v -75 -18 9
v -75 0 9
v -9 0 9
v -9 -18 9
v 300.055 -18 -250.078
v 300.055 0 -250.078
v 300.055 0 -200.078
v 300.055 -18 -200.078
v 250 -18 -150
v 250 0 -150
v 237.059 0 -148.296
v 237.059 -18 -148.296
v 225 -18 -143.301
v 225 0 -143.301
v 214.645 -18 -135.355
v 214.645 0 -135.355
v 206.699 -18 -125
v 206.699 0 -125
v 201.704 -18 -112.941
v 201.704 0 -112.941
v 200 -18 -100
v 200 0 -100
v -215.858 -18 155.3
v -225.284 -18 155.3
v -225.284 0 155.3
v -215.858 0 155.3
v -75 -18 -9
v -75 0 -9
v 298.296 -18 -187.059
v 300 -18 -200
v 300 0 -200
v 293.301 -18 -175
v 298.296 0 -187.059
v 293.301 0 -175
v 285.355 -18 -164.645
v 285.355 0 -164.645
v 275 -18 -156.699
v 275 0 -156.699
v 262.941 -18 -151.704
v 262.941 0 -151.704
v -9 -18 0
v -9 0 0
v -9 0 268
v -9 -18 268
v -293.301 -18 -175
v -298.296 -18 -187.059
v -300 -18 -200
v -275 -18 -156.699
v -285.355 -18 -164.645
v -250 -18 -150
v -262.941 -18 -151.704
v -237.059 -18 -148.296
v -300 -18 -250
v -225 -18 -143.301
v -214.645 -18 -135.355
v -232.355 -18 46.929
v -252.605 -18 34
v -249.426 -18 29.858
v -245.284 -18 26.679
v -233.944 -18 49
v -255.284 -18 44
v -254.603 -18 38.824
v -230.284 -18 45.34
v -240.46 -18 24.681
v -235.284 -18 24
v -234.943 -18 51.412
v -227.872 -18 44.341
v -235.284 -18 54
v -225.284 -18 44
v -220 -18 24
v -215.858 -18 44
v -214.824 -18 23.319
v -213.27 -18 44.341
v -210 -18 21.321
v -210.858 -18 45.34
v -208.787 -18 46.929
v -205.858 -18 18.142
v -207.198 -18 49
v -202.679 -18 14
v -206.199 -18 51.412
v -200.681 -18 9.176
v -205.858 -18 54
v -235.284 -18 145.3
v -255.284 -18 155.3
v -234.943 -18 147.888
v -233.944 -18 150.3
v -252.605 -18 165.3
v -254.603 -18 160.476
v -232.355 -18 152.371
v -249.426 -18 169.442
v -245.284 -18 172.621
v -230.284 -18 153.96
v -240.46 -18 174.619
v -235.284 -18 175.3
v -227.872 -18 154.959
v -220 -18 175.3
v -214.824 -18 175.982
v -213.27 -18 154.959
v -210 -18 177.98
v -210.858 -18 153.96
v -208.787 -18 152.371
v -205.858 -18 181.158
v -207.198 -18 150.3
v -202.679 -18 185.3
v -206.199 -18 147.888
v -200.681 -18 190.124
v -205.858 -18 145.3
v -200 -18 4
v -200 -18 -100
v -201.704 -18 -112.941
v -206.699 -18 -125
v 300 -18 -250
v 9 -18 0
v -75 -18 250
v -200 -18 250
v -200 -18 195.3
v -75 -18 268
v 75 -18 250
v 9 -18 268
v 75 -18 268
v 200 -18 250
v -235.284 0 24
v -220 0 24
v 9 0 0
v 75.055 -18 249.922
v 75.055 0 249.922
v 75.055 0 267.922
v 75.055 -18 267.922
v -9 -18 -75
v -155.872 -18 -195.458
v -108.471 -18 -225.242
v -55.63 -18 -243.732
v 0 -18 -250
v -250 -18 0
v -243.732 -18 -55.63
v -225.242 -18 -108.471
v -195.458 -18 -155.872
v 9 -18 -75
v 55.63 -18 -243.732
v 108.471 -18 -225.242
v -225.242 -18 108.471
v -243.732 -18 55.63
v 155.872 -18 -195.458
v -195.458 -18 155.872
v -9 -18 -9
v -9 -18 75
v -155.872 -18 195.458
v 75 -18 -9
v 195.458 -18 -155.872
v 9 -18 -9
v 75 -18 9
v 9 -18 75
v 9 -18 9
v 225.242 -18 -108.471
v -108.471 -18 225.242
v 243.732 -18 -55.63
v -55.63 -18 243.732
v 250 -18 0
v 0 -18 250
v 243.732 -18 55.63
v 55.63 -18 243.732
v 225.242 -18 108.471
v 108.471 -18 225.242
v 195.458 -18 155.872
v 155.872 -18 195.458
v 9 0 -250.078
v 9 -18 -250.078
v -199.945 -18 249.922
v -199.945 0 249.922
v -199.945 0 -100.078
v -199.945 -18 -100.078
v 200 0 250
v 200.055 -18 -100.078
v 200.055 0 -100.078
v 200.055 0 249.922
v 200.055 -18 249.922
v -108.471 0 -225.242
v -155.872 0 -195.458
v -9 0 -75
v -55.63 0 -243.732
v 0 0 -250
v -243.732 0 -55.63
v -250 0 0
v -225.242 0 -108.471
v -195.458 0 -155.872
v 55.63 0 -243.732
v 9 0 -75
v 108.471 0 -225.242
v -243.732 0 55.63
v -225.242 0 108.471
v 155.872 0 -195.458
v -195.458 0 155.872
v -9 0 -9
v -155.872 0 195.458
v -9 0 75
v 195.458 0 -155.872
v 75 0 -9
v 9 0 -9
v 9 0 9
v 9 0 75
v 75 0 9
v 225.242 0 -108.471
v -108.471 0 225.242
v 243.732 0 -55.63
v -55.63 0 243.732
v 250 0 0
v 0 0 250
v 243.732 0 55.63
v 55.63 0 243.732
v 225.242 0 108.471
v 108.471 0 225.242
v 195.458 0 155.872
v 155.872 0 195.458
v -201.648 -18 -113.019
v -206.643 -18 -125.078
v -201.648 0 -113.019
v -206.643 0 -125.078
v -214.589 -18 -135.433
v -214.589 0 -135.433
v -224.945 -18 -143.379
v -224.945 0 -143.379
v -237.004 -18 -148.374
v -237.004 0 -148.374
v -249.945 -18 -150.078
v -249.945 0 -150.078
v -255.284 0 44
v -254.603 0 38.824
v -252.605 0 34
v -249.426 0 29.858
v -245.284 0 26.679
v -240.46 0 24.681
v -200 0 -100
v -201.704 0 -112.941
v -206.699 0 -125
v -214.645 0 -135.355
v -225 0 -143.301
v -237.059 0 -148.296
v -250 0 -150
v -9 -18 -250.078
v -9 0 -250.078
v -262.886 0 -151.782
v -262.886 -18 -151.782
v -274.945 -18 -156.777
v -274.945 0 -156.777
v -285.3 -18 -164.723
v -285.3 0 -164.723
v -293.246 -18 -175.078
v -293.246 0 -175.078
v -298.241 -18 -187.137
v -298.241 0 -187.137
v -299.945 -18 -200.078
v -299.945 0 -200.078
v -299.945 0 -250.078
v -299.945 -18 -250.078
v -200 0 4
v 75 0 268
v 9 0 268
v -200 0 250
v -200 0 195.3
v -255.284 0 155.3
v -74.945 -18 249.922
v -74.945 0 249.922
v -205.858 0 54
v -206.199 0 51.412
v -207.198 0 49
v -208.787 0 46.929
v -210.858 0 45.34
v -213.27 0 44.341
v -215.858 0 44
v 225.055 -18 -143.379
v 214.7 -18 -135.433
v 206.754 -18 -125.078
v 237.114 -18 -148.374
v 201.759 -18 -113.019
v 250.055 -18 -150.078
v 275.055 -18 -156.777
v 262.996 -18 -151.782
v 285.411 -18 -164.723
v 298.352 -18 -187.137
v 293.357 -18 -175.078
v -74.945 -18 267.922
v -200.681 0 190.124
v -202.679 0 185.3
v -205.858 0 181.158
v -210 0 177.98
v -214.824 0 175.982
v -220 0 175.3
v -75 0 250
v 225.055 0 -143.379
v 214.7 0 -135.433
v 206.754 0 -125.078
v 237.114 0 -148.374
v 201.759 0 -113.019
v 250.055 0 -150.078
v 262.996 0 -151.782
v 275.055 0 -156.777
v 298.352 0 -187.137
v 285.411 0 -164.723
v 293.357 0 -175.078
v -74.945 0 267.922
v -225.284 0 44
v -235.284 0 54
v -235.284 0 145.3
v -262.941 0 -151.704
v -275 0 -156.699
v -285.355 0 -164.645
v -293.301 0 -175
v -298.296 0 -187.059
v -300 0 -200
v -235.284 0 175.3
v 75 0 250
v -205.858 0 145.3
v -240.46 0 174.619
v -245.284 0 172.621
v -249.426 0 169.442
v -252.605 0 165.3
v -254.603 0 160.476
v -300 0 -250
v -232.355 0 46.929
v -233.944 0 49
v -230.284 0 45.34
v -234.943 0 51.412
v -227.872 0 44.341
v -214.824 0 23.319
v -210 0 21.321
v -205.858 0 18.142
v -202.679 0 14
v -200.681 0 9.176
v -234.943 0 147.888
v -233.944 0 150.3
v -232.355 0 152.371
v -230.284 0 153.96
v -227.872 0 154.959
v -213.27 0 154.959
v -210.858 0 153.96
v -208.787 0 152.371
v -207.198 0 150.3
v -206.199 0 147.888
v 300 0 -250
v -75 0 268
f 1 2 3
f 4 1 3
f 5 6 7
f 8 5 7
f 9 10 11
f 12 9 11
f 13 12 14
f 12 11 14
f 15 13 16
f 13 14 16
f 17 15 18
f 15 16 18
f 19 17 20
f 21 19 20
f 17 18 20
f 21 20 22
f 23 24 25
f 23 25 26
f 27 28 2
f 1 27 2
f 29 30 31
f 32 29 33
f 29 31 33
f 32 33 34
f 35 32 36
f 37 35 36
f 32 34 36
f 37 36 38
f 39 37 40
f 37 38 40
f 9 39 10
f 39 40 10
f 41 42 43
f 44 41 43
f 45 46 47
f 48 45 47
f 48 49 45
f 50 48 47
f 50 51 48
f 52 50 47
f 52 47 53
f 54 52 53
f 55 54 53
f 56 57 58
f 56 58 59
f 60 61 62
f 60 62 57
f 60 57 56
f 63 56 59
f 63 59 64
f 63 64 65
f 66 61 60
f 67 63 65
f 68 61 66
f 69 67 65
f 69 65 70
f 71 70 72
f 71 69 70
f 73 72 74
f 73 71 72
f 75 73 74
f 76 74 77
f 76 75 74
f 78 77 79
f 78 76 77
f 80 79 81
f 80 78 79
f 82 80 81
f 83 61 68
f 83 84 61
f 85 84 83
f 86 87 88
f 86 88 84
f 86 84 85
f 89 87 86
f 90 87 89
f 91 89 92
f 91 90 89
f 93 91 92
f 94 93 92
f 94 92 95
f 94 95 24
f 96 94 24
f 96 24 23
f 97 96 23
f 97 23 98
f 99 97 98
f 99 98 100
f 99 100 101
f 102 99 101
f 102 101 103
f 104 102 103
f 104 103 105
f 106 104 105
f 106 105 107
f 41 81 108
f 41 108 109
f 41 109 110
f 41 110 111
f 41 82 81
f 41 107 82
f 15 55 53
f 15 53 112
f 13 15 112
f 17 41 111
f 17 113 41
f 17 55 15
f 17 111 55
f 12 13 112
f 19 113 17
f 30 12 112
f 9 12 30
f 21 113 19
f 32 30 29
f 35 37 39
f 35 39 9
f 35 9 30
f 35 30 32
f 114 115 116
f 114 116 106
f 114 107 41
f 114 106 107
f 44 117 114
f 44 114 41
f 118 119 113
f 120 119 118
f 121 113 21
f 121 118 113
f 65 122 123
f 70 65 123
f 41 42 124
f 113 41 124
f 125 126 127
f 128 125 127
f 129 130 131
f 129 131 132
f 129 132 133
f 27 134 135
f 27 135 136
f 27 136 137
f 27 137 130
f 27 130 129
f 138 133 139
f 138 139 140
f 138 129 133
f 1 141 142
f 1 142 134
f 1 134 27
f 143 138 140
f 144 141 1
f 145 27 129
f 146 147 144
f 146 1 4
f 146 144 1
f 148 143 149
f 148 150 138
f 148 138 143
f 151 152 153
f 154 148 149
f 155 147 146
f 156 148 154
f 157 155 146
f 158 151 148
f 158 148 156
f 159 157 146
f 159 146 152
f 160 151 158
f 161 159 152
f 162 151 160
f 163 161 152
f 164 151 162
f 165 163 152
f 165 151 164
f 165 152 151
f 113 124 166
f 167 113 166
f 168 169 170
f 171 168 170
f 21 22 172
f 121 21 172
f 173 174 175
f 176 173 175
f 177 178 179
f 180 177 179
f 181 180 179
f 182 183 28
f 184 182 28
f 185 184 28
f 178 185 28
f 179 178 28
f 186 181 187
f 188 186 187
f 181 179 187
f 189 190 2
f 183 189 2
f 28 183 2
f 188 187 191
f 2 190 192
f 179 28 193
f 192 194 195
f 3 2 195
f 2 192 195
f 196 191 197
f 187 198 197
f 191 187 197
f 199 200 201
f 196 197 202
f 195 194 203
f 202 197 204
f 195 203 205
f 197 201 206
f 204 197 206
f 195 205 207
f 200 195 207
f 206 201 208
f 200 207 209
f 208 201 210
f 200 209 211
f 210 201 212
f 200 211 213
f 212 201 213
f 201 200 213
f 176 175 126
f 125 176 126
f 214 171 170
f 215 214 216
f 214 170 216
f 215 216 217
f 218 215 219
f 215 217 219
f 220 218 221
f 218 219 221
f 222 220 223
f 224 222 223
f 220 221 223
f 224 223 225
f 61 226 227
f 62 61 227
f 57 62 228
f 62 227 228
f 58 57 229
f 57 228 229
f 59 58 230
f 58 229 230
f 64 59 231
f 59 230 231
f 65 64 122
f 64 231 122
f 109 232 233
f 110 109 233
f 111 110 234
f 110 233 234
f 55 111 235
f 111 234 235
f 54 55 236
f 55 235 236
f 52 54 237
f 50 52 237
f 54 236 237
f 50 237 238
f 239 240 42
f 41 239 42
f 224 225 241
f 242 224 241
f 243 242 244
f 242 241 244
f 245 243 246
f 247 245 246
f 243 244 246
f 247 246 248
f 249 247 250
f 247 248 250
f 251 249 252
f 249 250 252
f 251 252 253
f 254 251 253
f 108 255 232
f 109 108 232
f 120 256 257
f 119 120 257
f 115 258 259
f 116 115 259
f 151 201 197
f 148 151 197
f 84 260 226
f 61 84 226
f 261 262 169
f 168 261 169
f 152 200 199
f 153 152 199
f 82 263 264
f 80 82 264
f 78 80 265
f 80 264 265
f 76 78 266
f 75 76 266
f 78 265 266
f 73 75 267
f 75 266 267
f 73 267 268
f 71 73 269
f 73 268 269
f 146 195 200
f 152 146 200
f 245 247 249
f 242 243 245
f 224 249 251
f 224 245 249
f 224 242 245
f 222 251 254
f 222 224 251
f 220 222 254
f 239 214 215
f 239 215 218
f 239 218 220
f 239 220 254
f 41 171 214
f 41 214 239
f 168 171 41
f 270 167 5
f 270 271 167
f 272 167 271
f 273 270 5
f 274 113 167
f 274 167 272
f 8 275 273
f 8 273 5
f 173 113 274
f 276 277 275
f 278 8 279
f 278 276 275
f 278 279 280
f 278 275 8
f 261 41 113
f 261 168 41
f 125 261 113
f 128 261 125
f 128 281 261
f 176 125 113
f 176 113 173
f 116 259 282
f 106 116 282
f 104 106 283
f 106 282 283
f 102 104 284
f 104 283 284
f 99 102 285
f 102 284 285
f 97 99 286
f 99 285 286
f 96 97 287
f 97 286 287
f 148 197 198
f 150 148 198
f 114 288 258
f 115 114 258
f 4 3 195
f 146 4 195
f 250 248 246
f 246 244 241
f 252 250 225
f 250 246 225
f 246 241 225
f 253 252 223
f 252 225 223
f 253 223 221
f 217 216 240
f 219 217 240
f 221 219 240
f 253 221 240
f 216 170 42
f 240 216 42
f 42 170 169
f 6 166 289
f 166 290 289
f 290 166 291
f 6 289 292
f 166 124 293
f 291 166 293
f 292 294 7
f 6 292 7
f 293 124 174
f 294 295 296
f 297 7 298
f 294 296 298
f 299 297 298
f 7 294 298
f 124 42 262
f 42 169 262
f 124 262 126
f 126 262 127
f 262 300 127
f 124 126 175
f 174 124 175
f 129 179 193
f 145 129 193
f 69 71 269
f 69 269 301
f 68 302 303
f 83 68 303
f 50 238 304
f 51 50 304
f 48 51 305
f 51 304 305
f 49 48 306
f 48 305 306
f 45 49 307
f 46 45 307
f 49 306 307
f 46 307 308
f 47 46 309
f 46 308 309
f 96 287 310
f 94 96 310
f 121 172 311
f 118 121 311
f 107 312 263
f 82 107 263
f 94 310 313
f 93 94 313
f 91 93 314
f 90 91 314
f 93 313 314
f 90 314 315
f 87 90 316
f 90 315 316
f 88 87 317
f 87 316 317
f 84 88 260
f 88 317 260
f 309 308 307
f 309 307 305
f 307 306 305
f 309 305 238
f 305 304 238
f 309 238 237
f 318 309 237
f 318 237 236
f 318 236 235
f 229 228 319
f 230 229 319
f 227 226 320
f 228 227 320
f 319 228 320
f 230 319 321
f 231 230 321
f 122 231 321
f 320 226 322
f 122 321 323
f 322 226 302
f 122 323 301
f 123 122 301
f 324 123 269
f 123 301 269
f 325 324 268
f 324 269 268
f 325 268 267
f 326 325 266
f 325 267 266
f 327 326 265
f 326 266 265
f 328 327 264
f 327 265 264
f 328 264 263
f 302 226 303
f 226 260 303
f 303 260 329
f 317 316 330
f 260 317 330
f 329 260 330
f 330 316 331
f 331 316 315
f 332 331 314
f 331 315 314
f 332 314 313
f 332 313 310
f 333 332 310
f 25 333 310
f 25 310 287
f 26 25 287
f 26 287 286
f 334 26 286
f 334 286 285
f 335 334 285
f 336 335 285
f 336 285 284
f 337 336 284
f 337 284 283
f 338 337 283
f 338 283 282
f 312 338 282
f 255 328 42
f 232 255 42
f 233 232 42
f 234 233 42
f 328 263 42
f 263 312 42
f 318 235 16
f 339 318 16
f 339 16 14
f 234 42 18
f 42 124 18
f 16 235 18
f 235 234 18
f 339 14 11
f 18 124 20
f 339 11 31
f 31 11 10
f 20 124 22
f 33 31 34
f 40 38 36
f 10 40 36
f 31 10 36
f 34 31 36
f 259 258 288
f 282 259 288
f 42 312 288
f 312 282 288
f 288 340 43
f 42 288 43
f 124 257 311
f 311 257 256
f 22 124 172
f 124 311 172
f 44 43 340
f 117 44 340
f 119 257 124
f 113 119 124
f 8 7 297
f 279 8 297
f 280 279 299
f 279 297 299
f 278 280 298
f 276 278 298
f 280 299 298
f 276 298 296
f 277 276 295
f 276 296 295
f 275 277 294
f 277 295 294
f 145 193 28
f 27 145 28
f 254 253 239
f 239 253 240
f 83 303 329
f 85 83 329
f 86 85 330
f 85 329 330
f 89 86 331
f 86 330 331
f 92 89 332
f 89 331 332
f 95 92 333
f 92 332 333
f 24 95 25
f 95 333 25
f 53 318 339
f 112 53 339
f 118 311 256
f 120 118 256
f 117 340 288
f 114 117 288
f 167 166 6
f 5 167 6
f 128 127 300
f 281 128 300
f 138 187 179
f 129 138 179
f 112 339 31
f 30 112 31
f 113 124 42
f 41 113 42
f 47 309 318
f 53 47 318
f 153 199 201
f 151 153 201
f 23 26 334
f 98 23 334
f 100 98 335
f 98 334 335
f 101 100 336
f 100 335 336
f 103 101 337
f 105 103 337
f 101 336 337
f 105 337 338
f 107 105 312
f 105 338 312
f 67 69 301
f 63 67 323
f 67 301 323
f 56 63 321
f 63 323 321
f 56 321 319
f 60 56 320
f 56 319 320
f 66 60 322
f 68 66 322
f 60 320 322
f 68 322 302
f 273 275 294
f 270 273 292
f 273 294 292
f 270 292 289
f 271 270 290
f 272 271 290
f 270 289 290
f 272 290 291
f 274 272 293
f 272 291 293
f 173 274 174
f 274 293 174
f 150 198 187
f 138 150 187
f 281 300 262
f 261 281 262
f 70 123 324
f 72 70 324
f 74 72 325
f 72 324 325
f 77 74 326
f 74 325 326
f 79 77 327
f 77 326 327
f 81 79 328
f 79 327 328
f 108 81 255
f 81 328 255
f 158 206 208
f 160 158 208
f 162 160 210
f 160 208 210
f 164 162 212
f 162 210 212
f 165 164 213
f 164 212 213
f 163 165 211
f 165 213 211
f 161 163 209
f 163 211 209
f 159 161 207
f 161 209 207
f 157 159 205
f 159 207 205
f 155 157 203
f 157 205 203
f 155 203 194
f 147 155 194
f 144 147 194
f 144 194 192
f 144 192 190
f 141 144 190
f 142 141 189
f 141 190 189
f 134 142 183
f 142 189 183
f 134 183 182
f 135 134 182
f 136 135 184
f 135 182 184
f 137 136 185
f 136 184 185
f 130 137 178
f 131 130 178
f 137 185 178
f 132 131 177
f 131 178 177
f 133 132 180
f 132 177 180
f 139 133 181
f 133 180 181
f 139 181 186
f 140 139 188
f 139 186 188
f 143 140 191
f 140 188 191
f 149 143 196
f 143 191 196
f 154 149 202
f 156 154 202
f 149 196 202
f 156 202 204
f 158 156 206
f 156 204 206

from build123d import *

# Parameters (mm, degrees)
F2_DEPTH = 18
F3_DEPTH = 18
F4_R     = 250
F5_DEPTH = 18


with BuildPart() as f2:
    # F0 (on Front) → F2 (new body)
    with BuildSketch(Plane.XZ):
        with BuildLine():
            Line((-200, -250), (200, -250))
            Line((200, -250), (300, -250))
            Line((300, -250), (300, -200))
            ThreePointArc((300, -200), (285.355339, -164.644661), (250, -150))
            ThreePointArc((250, -150), (214.644661, -135.355339), (200, -100))
            Line((200, -100), (200, 250))
            Line((200, 250), (75, 250))
            Line((75, 250), (75, 268))
            Line((75, 268), (9, 268))
            Line((9, 268), (9, 0))
            Line((9, 0), (-9, 0))
            Line((-9, 0), (-9, 268))
            Line((-9, 268), (-75, 268))
            Line((-75, 268), (-75, 250))
            Line((-75, 250), (-200, 250))
            Line((-200, 250), (-200, 195.300018))
            ThreePointArc((-200, 195.300018), (-205.857864, 181.157882), (-220, 175.300018))
            Line((-220, 175.300018), (-235.284025, 175.300018))
            ThreePointArc((-235.284025, 175.300018), (-249.426161, 169.442153), (-255.284025, 155.300018))
            Line((-255.284025, 155.300018), (-255.284025, 44.000003))
            ThreePointArc((-255.284025, 44.000003), (-249.426161, 29.857868), (-235.284025, 24.000003))
            Line((-235.284025, 24.000003), (-220, 24.000003))
            ThreePointArc((-220, 24.000003), (-205.857864, 18.142139), (-200, 4.000003))
            Line((-200, 4.000003), (-200, -100))
            ThreePointArc((-200, -100), (-214.644661, -135.355339), (-250, -150))
            ThreePointArc((-250, -150), (-285.355339, -164.644661), (-300, -200))
            Line((-300, -200), (-300, -250))
            Line((-300, -250), (-200, -250))
        make_face()
        with BuildLine():
            ThreePointArc((-235.284025, 145.300018), (-232.355093, 152.371085), (-225.284025, 155.300018))
            Line((-225.284025, 155.300018), (-215.857864, 155.300018))
            ThreePointArc((-215.857864, 155.300018), (-208.786797, 152.371085), (-205.857864, 145.300018))
            Line((-205.857864, 145.300018), (-205.857864, 54.000003))
            ThreePointArc((-205.857864, 54.000003), (-208.786797, 46.928936), (-215.857864, 44.000003))
            Line((-215.857864, 44.000003), (-225.284025, 44.000003))
            ThreePointArc((-225.284025, 44.000003), (-232.355093, 46.928936), (-235.284025, 54.000003))
            Line((-235.284025, 54.000003), (-235.284025, 145.300018))
        make_face(mode=Mode.SUBTRACT)
    extrude(amount=F2_DEPTH)


with BuildPart() as f3:
    # F1 (on Front) → F3 (new body)
    with BuildSketch(Plane.XZ):
        with BuildLine():
            Line((9, -250.078043), (200.055361, -250.078043))
            Line((200.055361, -250.078043), (300.055361, -250.078043))
            Line((300.055361, -250.078043), (300.055361, -200.078043))
            ThreePointArc((300.055361, -200.078043), (285.4107, -164.722704), (250.055361, -150.078043))
            ThreePointArc((250.055361, -150.078043), (214.700022, -135.433382), (200.055361, -100.078043))
            Line((200.055361, -100.078043), (200.055361, 249.921957))
            Line((200.055361, 249.921957), (75.055361, 249.921957))
            Line((75.055361, 249.921957), (75.055361, 267.921957))
            Line((75.055361, 267.921957), (-74.944639, 267.921957))
            Line((-74.944639, 267.921957), (-74.944639, 249.921957))
            Line((-74.944639, 249.921957), (-199.944639, 249.921957))
            Line((-199.944639, 249.921957), (-199.944639, -100.078043))
            ThreePointArc((-199.944639, -100.078043), (-214.5893, -135.433382), (-249.944639, -150.078043))
            ThreePointArc((-249.944639, -150.078043), (-285.299978, -164.722704), (-299.944639, -200.078043))
            Line((-299.944639, -200.078043), (-299.944639, -250.078043))
            Line((-299.944639, -250.078043), (-199.944639, -250.078043))
            Line((-199.944639, -250.078043), (-9, -250.078043))
            Line((-9, -250.078043), (-9, 0))
            Line((-9, 0), (9, 0))
            Line((9, 0), (9, -250.078043))
        make_face()
    extrude(amount=F3_DEPTH)


with BuildPart() as f5:
    # F4 (on Front) → F5 (new body)
    with BuildSketch(Plane.XZ):
        Circle(F4_R)
        Polygon((75, 9), (75, -9), (9, -9), (9, -75), (-9, -75), (-9, -9), (-75, -9), (-75, 9), (-9, 9), (-9, 75), (9, 75), (9, 9), align=None, mode=Mode.SUBTRACT)
    extrude(amount=F5_DEPTH)


solid = Compound([f2.part, f3.part, f5.part])
